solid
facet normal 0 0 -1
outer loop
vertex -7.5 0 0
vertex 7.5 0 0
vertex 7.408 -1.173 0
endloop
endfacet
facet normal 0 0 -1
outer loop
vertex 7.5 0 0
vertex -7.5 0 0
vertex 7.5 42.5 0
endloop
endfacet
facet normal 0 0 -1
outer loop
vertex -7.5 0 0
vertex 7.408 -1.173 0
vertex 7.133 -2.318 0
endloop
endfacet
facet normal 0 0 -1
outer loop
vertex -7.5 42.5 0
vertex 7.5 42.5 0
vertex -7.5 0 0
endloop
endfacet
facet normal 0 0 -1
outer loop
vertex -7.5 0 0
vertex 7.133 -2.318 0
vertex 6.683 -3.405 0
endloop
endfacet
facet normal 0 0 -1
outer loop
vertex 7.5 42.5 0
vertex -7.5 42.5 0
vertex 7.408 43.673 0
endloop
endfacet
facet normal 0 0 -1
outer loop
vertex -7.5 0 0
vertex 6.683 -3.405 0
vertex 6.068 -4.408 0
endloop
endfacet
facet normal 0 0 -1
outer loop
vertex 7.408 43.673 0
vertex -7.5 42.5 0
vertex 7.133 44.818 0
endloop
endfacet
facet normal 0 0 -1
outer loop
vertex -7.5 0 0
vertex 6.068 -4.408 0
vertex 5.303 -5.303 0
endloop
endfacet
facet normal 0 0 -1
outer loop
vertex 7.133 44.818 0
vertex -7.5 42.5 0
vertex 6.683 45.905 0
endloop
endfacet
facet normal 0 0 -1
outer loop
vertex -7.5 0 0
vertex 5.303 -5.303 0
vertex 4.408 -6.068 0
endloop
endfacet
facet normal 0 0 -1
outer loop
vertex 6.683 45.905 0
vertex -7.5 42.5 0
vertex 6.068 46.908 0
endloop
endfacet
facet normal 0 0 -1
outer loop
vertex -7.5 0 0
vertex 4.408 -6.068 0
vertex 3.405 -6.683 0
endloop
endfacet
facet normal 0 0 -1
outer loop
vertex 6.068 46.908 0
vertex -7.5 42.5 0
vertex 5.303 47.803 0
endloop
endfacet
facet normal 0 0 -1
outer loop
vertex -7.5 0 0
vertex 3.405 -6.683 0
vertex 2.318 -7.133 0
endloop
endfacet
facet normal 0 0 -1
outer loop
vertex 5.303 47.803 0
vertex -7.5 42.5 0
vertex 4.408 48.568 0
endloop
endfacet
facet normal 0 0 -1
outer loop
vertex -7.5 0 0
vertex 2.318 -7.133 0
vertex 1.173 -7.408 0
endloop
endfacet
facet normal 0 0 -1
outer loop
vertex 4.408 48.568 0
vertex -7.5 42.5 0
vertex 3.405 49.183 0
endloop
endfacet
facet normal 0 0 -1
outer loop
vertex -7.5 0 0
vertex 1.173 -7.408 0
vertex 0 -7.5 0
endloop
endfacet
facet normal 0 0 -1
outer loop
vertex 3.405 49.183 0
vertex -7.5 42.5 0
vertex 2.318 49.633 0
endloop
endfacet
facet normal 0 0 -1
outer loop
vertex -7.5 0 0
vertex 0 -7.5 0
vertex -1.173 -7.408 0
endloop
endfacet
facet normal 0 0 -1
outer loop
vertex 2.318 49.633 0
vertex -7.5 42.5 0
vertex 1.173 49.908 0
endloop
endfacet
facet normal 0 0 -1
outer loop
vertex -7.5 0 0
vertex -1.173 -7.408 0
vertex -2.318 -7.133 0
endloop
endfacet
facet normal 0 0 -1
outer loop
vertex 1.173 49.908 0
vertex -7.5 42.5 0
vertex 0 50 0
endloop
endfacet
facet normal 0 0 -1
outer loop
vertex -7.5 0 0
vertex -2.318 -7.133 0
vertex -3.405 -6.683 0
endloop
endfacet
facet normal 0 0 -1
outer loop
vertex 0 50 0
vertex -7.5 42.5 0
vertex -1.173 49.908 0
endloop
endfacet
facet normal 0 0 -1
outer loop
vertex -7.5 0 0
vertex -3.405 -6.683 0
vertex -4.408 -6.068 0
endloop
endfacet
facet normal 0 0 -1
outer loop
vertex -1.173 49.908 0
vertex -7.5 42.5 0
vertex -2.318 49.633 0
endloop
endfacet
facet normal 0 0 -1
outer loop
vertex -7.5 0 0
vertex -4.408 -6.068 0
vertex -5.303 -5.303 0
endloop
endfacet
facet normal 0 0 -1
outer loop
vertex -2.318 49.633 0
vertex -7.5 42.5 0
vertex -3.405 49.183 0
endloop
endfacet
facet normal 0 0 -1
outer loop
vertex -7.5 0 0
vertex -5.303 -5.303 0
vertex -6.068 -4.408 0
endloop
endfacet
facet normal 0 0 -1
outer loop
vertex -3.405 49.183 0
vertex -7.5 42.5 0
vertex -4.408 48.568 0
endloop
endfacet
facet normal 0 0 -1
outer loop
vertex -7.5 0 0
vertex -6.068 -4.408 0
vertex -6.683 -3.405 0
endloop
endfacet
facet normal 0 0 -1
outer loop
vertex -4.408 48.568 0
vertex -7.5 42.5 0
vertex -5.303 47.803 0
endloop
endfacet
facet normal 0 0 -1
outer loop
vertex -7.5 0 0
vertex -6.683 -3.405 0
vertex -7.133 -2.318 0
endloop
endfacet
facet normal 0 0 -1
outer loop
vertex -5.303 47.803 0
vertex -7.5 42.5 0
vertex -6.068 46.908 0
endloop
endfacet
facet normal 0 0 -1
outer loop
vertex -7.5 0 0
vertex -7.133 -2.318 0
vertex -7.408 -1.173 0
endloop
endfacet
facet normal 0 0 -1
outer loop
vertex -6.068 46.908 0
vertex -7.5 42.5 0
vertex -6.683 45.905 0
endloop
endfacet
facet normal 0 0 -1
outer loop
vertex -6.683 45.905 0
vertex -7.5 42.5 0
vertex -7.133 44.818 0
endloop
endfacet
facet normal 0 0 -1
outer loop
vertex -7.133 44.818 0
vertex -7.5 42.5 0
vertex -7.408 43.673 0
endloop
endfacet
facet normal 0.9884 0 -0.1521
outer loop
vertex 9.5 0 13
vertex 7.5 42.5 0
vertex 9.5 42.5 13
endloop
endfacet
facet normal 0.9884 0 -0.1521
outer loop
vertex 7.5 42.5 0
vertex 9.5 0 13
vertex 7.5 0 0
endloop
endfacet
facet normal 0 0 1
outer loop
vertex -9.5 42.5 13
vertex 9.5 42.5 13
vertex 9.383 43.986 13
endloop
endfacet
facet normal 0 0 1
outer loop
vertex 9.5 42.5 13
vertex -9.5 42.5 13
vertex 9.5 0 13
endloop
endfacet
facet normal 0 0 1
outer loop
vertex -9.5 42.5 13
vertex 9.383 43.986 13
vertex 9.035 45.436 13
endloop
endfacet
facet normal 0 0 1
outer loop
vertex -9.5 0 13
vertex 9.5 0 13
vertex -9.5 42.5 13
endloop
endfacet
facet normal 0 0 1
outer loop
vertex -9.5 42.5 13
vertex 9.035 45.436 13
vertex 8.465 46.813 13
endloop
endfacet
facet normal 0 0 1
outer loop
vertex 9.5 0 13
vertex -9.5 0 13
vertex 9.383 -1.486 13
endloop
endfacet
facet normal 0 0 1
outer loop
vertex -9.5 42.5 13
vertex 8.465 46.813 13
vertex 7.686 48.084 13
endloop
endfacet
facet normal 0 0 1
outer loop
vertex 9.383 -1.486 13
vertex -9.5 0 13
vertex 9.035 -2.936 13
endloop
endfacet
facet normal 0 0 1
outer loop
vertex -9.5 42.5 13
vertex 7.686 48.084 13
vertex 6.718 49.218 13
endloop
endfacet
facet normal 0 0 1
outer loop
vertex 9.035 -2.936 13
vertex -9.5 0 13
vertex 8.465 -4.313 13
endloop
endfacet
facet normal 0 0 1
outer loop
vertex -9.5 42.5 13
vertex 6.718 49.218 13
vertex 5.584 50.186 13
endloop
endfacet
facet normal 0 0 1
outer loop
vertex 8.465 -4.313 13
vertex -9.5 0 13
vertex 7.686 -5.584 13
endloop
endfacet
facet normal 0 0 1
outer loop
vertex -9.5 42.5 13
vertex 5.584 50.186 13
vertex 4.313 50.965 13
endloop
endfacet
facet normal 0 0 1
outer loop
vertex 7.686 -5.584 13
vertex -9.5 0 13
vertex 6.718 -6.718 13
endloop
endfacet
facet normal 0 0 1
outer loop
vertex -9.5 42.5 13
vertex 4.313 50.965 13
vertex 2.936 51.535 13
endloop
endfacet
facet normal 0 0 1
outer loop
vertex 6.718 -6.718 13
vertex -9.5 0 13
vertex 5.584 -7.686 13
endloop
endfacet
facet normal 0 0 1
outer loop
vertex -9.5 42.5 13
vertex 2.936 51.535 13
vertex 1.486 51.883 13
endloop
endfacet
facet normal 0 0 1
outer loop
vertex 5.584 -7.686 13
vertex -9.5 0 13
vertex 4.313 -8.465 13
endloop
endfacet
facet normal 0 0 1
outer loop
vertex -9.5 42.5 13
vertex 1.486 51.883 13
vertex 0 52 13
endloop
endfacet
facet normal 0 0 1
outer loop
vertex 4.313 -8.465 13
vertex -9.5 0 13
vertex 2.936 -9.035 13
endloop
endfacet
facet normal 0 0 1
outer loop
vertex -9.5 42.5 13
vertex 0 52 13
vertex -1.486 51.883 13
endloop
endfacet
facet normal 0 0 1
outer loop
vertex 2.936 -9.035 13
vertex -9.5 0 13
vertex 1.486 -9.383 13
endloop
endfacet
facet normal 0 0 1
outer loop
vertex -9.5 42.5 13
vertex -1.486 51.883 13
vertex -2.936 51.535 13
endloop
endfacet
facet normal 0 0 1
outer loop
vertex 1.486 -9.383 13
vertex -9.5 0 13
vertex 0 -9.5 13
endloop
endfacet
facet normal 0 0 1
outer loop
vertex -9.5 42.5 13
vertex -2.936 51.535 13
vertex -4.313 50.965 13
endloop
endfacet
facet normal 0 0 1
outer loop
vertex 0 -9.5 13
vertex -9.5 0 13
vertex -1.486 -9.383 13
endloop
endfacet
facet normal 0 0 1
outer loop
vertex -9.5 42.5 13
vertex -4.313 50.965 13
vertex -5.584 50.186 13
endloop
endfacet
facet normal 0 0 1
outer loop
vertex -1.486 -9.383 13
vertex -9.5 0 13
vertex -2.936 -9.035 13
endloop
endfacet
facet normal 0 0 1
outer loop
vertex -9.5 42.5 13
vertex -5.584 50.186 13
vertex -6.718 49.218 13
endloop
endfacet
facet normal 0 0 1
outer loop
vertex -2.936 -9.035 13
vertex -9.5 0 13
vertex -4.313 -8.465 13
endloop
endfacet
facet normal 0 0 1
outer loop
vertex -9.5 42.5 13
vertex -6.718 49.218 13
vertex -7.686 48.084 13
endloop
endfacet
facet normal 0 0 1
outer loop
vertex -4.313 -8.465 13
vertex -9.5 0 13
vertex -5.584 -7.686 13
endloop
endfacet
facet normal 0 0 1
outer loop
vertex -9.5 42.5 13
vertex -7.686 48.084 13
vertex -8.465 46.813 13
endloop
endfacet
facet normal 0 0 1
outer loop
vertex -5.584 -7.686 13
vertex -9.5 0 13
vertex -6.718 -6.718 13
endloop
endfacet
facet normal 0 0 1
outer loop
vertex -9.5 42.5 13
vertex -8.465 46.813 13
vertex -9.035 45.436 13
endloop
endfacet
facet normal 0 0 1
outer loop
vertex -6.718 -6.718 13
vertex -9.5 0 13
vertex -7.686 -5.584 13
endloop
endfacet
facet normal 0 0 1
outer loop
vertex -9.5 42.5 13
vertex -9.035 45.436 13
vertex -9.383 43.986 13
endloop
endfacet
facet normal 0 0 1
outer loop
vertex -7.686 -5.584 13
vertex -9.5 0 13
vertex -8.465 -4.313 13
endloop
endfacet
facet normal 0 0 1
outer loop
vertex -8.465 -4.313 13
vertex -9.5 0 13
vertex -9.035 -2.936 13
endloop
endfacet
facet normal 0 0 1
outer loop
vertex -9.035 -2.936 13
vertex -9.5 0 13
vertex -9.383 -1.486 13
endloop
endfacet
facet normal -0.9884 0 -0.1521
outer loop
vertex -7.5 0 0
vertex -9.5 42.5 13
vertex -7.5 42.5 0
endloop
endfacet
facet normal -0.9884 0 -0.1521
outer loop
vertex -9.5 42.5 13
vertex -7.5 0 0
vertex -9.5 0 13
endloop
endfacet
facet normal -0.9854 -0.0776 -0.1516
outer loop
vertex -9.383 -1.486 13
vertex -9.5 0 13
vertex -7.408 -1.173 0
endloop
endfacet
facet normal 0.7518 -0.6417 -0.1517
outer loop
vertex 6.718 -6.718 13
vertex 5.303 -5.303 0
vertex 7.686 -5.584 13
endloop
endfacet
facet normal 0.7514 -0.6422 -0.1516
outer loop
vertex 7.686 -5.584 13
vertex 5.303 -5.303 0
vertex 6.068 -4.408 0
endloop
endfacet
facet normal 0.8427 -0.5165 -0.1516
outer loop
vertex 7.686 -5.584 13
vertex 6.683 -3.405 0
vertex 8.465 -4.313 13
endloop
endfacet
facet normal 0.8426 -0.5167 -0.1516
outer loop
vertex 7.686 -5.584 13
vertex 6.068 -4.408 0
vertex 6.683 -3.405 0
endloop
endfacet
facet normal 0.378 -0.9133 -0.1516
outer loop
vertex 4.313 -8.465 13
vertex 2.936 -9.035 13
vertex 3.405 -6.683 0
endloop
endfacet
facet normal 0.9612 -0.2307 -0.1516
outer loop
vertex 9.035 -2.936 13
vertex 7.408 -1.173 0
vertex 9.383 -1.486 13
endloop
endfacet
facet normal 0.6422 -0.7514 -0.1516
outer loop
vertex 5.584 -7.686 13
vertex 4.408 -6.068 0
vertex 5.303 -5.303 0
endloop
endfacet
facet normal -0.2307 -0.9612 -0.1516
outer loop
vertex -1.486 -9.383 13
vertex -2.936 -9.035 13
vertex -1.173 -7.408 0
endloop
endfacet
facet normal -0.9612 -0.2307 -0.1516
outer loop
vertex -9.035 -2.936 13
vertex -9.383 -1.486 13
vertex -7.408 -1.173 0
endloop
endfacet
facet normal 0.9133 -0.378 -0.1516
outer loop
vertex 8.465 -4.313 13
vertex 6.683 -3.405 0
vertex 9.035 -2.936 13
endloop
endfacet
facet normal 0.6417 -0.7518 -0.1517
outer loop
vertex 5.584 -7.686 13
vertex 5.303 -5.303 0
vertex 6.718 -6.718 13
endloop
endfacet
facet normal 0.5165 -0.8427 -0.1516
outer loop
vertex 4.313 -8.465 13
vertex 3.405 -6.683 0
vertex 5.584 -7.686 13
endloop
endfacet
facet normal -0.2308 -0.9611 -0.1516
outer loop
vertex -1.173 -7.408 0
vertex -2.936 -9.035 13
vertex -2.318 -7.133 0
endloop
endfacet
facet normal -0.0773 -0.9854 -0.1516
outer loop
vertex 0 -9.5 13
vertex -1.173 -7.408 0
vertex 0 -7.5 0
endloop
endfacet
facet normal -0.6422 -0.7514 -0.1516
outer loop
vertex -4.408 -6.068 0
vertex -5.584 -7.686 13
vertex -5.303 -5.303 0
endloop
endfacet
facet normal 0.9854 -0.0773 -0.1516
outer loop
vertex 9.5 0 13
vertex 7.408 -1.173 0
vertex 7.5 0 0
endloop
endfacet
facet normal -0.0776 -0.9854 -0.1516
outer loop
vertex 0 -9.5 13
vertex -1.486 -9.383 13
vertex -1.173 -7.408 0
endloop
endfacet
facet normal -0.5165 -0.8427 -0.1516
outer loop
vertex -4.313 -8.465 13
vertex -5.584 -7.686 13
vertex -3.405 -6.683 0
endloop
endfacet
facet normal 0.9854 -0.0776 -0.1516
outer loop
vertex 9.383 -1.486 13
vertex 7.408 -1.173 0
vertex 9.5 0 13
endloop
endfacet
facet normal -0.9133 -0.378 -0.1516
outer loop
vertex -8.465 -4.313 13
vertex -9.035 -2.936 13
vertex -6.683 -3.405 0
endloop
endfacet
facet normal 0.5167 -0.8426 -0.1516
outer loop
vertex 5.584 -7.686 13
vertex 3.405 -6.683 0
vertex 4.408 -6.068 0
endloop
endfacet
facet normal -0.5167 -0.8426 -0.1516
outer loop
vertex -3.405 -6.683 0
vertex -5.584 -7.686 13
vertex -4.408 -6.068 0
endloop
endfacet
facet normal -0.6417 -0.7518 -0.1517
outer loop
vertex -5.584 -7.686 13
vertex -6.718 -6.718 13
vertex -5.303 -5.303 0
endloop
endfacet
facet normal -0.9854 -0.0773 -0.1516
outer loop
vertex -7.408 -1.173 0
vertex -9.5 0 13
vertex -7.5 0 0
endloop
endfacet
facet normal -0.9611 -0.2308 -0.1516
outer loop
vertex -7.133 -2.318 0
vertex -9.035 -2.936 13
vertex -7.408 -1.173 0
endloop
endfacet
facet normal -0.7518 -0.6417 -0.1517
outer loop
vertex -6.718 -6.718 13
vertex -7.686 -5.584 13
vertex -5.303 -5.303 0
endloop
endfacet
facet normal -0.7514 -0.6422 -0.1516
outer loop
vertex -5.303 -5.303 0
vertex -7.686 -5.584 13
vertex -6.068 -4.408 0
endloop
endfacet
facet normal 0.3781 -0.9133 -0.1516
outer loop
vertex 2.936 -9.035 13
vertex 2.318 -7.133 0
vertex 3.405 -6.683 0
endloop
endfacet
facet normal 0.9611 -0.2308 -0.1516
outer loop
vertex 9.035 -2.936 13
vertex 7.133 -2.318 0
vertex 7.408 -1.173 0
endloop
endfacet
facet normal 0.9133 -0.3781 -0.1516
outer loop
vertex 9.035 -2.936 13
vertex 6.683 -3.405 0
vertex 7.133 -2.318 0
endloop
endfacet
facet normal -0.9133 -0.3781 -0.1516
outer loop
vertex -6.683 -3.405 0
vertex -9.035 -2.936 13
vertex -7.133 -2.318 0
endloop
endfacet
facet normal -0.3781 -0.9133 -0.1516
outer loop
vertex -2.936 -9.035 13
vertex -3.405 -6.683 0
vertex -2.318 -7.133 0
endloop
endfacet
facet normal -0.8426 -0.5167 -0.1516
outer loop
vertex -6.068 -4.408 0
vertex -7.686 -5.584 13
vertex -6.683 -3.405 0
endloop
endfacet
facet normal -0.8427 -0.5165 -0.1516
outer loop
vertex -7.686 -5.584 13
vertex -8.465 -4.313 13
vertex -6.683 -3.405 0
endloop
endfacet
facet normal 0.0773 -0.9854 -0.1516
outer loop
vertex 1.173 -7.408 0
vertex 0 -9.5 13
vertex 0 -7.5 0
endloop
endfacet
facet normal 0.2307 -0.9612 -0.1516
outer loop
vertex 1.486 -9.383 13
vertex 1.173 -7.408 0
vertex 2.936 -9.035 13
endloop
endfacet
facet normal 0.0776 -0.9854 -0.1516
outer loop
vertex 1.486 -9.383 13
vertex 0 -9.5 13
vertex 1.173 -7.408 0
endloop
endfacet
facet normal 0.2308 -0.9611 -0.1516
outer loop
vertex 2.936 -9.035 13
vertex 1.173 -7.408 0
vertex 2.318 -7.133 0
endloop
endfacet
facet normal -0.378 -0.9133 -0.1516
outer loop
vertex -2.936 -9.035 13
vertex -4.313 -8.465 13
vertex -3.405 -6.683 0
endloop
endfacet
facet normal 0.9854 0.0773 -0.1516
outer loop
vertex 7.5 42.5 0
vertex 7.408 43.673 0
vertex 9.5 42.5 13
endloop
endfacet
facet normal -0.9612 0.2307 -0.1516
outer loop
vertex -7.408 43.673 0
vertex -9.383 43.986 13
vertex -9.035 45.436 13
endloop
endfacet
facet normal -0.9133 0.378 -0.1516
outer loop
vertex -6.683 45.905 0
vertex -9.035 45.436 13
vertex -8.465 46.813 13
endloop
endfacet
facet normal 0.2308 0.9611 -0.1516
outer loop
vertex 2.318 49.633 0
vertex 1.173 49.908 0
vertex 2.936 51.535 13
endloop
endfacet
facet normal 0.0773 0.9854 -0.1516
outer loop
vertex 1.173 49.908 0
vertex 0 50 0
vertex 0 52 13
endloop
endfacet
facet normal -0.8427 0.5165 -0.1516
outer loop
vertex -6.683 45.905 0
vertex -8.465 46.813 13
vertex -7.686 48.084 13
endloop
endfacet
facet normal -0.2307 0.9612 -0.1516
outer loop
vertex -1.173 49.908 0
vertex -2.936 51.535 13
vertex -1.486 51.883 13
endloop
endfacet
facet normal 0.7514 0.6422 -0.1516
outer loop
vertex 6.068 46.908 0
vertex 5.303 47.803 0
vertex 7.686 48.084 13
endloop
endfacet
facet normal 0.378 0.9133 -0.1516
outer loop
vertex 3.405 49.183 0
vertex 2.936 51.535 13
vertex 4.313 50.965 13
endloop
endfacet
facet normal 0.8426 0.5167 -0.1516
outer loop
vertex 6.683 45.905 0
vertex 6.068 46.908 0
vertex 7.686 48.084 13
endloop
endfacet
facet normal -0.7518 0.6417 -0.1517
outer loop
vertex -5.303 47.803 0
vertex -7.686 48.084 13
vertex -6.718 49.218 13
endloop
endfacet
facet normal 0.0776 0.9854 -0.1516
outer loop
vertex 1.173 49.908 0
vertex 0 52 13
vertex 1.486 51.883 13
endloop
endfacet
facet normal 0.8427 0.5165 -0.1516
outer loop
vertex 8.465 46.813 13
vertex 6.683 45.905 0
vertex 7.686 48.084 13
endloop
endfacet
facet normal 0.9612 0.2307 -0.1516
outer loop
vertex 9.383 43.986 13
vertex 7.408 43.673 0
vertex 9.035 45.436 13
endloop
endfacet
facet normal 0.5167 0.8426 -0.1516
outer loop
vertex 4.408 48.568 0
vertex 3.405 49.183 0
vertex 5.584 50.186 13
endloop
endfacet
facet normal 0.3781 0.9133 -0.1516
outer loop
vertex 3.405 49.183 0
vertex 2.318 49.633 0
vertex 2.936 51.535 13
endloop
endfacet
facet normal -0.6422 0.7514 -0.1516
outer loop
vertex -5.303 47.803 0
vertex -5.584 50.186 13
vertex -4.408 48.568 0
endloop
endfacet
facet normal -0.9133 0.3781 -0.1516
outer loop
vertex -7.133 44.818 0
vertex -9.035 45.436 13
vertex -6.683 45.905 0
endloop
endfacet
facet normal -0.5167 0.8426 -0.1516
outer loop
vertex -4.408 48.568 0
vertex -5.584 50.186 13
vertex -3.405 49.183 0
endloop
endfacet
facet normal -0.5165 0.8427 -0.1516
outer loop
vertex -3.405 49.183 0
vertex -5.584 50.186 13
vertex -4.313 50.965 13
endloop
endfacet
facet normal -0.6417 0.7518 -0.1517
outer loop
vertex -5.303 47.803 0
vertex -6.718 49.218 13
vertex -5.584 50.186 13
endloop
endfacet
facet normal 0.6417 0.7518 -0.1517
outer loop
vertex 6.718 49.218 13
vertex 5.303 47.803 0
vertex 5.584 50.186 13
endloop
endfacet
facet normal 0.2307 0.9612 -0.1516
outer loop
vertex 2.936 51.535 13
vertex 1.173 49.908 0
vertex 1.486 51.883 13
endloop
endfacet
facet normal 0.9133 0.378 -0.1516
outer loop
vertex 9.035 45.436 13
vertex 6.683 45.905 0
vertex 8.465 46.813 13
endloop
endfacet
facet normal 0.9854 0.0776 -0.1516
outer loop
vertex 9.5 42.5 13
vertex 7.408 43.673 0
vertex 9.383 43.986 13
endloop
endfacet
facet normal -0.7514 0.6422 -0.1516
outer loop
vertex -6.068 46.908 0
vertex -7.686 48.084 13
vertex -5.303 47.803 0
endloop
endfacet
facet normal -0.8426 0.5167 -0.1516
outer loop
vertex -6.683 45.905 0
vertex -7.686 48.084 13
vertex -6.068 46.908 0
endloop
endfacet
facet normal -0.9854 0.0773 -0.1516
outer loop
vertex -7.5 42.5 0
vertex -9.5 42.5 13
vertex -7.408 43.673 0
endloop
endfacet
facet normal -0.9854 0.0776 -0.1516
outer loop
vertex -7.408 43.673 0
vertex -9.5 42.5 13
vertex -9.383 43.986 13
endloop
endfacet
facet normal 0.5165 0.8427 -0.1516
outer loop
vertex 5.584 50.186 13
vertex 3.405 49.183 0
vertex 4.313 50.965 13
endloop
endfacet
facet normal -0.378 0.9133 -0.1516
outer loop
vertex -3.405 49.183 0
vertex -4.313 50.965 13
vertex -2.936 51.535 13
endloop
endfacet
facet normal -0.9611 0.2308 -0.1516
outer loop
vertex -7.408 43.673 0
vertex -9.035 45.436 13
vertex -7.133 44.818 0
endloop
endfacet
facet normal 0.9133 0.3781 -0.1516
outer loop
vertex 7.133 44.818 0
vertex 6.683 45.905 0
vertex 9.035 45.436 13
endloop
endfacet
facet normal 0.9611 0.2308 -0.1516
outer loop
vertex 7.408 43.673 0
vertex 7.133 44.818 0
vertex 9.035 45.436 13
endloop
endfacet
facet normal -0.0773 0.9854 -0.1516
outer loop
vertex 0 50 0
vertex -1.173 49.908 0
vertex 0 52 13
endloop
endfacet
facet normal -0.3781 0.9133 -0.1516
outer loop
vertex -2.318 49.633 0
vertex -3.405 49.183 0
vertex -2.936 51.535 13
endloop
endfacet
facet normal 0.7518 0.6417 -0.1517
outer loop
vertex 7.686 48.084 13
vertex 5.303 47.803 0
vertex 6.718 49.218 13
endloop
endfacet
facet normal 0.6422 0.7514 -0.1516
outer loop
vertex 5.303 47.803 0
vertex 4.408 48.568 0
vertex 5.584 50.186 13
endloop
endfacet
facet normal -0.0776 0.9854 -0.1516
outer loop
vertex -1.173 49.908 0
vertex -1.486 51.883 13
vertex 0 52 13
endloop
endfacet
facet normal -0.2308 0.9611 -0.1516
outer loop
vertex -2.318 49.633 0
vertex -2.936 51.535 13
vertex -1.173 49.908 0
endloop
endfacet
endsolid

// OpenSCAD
//  A foot for the bottom of toilet seat

// Change these
height=13;
topLength=52;
topWidth=19;
bottomLength=42;
bottomWidth=15;
$fn = 40;

// Leave these alone
topRadius=topWidth/2;
bottomRadius=bottomWidth/2;
polyLength=topLength-topRadius; // Not topLength-2*topRadius because 1st cylindar is centered on 0

//https://en.wikibooks.org/wiki/OpenSCAD_User_Manual/The_OpenSCAD_Language#polygon

CubePoints = [
  [  -bottomWidth/2,  0,  0 ],  //0
  [ bottomWidth/2,  0,  0 ],  //1
  [ bottomWidth/2,  polyLength,  0 ],  //2
  [  -bottomWidth/2,  polyLength,  0 ],  //3
  [  -topWidth/2,  0,  height],  //4
  [ topWidth/2,  0,  height ],  //5
  [ topWidth/2,  polyLength,  height ],  //6
  [  -topWidth/2,  polyLength,  height ]]; //7
  
CubeFaces = [
  [0,1,2,3],  // bottom
  [4,5,1,0],  // front
  [7,6,5,4],  // top
  [5,6,2,1],  // right
  [6,7,3,2],  // back
  [7,4,0,3]]; // left
  
polyhedron( CubePoints, CubeFaces );

cylinder(r1=bottomRadius, r2=topRadius, h=height, center=false);

translate([0,polyLength,0])  cylinder(r1=bottomRadius, r2=topRadius, h=height, center=false);
